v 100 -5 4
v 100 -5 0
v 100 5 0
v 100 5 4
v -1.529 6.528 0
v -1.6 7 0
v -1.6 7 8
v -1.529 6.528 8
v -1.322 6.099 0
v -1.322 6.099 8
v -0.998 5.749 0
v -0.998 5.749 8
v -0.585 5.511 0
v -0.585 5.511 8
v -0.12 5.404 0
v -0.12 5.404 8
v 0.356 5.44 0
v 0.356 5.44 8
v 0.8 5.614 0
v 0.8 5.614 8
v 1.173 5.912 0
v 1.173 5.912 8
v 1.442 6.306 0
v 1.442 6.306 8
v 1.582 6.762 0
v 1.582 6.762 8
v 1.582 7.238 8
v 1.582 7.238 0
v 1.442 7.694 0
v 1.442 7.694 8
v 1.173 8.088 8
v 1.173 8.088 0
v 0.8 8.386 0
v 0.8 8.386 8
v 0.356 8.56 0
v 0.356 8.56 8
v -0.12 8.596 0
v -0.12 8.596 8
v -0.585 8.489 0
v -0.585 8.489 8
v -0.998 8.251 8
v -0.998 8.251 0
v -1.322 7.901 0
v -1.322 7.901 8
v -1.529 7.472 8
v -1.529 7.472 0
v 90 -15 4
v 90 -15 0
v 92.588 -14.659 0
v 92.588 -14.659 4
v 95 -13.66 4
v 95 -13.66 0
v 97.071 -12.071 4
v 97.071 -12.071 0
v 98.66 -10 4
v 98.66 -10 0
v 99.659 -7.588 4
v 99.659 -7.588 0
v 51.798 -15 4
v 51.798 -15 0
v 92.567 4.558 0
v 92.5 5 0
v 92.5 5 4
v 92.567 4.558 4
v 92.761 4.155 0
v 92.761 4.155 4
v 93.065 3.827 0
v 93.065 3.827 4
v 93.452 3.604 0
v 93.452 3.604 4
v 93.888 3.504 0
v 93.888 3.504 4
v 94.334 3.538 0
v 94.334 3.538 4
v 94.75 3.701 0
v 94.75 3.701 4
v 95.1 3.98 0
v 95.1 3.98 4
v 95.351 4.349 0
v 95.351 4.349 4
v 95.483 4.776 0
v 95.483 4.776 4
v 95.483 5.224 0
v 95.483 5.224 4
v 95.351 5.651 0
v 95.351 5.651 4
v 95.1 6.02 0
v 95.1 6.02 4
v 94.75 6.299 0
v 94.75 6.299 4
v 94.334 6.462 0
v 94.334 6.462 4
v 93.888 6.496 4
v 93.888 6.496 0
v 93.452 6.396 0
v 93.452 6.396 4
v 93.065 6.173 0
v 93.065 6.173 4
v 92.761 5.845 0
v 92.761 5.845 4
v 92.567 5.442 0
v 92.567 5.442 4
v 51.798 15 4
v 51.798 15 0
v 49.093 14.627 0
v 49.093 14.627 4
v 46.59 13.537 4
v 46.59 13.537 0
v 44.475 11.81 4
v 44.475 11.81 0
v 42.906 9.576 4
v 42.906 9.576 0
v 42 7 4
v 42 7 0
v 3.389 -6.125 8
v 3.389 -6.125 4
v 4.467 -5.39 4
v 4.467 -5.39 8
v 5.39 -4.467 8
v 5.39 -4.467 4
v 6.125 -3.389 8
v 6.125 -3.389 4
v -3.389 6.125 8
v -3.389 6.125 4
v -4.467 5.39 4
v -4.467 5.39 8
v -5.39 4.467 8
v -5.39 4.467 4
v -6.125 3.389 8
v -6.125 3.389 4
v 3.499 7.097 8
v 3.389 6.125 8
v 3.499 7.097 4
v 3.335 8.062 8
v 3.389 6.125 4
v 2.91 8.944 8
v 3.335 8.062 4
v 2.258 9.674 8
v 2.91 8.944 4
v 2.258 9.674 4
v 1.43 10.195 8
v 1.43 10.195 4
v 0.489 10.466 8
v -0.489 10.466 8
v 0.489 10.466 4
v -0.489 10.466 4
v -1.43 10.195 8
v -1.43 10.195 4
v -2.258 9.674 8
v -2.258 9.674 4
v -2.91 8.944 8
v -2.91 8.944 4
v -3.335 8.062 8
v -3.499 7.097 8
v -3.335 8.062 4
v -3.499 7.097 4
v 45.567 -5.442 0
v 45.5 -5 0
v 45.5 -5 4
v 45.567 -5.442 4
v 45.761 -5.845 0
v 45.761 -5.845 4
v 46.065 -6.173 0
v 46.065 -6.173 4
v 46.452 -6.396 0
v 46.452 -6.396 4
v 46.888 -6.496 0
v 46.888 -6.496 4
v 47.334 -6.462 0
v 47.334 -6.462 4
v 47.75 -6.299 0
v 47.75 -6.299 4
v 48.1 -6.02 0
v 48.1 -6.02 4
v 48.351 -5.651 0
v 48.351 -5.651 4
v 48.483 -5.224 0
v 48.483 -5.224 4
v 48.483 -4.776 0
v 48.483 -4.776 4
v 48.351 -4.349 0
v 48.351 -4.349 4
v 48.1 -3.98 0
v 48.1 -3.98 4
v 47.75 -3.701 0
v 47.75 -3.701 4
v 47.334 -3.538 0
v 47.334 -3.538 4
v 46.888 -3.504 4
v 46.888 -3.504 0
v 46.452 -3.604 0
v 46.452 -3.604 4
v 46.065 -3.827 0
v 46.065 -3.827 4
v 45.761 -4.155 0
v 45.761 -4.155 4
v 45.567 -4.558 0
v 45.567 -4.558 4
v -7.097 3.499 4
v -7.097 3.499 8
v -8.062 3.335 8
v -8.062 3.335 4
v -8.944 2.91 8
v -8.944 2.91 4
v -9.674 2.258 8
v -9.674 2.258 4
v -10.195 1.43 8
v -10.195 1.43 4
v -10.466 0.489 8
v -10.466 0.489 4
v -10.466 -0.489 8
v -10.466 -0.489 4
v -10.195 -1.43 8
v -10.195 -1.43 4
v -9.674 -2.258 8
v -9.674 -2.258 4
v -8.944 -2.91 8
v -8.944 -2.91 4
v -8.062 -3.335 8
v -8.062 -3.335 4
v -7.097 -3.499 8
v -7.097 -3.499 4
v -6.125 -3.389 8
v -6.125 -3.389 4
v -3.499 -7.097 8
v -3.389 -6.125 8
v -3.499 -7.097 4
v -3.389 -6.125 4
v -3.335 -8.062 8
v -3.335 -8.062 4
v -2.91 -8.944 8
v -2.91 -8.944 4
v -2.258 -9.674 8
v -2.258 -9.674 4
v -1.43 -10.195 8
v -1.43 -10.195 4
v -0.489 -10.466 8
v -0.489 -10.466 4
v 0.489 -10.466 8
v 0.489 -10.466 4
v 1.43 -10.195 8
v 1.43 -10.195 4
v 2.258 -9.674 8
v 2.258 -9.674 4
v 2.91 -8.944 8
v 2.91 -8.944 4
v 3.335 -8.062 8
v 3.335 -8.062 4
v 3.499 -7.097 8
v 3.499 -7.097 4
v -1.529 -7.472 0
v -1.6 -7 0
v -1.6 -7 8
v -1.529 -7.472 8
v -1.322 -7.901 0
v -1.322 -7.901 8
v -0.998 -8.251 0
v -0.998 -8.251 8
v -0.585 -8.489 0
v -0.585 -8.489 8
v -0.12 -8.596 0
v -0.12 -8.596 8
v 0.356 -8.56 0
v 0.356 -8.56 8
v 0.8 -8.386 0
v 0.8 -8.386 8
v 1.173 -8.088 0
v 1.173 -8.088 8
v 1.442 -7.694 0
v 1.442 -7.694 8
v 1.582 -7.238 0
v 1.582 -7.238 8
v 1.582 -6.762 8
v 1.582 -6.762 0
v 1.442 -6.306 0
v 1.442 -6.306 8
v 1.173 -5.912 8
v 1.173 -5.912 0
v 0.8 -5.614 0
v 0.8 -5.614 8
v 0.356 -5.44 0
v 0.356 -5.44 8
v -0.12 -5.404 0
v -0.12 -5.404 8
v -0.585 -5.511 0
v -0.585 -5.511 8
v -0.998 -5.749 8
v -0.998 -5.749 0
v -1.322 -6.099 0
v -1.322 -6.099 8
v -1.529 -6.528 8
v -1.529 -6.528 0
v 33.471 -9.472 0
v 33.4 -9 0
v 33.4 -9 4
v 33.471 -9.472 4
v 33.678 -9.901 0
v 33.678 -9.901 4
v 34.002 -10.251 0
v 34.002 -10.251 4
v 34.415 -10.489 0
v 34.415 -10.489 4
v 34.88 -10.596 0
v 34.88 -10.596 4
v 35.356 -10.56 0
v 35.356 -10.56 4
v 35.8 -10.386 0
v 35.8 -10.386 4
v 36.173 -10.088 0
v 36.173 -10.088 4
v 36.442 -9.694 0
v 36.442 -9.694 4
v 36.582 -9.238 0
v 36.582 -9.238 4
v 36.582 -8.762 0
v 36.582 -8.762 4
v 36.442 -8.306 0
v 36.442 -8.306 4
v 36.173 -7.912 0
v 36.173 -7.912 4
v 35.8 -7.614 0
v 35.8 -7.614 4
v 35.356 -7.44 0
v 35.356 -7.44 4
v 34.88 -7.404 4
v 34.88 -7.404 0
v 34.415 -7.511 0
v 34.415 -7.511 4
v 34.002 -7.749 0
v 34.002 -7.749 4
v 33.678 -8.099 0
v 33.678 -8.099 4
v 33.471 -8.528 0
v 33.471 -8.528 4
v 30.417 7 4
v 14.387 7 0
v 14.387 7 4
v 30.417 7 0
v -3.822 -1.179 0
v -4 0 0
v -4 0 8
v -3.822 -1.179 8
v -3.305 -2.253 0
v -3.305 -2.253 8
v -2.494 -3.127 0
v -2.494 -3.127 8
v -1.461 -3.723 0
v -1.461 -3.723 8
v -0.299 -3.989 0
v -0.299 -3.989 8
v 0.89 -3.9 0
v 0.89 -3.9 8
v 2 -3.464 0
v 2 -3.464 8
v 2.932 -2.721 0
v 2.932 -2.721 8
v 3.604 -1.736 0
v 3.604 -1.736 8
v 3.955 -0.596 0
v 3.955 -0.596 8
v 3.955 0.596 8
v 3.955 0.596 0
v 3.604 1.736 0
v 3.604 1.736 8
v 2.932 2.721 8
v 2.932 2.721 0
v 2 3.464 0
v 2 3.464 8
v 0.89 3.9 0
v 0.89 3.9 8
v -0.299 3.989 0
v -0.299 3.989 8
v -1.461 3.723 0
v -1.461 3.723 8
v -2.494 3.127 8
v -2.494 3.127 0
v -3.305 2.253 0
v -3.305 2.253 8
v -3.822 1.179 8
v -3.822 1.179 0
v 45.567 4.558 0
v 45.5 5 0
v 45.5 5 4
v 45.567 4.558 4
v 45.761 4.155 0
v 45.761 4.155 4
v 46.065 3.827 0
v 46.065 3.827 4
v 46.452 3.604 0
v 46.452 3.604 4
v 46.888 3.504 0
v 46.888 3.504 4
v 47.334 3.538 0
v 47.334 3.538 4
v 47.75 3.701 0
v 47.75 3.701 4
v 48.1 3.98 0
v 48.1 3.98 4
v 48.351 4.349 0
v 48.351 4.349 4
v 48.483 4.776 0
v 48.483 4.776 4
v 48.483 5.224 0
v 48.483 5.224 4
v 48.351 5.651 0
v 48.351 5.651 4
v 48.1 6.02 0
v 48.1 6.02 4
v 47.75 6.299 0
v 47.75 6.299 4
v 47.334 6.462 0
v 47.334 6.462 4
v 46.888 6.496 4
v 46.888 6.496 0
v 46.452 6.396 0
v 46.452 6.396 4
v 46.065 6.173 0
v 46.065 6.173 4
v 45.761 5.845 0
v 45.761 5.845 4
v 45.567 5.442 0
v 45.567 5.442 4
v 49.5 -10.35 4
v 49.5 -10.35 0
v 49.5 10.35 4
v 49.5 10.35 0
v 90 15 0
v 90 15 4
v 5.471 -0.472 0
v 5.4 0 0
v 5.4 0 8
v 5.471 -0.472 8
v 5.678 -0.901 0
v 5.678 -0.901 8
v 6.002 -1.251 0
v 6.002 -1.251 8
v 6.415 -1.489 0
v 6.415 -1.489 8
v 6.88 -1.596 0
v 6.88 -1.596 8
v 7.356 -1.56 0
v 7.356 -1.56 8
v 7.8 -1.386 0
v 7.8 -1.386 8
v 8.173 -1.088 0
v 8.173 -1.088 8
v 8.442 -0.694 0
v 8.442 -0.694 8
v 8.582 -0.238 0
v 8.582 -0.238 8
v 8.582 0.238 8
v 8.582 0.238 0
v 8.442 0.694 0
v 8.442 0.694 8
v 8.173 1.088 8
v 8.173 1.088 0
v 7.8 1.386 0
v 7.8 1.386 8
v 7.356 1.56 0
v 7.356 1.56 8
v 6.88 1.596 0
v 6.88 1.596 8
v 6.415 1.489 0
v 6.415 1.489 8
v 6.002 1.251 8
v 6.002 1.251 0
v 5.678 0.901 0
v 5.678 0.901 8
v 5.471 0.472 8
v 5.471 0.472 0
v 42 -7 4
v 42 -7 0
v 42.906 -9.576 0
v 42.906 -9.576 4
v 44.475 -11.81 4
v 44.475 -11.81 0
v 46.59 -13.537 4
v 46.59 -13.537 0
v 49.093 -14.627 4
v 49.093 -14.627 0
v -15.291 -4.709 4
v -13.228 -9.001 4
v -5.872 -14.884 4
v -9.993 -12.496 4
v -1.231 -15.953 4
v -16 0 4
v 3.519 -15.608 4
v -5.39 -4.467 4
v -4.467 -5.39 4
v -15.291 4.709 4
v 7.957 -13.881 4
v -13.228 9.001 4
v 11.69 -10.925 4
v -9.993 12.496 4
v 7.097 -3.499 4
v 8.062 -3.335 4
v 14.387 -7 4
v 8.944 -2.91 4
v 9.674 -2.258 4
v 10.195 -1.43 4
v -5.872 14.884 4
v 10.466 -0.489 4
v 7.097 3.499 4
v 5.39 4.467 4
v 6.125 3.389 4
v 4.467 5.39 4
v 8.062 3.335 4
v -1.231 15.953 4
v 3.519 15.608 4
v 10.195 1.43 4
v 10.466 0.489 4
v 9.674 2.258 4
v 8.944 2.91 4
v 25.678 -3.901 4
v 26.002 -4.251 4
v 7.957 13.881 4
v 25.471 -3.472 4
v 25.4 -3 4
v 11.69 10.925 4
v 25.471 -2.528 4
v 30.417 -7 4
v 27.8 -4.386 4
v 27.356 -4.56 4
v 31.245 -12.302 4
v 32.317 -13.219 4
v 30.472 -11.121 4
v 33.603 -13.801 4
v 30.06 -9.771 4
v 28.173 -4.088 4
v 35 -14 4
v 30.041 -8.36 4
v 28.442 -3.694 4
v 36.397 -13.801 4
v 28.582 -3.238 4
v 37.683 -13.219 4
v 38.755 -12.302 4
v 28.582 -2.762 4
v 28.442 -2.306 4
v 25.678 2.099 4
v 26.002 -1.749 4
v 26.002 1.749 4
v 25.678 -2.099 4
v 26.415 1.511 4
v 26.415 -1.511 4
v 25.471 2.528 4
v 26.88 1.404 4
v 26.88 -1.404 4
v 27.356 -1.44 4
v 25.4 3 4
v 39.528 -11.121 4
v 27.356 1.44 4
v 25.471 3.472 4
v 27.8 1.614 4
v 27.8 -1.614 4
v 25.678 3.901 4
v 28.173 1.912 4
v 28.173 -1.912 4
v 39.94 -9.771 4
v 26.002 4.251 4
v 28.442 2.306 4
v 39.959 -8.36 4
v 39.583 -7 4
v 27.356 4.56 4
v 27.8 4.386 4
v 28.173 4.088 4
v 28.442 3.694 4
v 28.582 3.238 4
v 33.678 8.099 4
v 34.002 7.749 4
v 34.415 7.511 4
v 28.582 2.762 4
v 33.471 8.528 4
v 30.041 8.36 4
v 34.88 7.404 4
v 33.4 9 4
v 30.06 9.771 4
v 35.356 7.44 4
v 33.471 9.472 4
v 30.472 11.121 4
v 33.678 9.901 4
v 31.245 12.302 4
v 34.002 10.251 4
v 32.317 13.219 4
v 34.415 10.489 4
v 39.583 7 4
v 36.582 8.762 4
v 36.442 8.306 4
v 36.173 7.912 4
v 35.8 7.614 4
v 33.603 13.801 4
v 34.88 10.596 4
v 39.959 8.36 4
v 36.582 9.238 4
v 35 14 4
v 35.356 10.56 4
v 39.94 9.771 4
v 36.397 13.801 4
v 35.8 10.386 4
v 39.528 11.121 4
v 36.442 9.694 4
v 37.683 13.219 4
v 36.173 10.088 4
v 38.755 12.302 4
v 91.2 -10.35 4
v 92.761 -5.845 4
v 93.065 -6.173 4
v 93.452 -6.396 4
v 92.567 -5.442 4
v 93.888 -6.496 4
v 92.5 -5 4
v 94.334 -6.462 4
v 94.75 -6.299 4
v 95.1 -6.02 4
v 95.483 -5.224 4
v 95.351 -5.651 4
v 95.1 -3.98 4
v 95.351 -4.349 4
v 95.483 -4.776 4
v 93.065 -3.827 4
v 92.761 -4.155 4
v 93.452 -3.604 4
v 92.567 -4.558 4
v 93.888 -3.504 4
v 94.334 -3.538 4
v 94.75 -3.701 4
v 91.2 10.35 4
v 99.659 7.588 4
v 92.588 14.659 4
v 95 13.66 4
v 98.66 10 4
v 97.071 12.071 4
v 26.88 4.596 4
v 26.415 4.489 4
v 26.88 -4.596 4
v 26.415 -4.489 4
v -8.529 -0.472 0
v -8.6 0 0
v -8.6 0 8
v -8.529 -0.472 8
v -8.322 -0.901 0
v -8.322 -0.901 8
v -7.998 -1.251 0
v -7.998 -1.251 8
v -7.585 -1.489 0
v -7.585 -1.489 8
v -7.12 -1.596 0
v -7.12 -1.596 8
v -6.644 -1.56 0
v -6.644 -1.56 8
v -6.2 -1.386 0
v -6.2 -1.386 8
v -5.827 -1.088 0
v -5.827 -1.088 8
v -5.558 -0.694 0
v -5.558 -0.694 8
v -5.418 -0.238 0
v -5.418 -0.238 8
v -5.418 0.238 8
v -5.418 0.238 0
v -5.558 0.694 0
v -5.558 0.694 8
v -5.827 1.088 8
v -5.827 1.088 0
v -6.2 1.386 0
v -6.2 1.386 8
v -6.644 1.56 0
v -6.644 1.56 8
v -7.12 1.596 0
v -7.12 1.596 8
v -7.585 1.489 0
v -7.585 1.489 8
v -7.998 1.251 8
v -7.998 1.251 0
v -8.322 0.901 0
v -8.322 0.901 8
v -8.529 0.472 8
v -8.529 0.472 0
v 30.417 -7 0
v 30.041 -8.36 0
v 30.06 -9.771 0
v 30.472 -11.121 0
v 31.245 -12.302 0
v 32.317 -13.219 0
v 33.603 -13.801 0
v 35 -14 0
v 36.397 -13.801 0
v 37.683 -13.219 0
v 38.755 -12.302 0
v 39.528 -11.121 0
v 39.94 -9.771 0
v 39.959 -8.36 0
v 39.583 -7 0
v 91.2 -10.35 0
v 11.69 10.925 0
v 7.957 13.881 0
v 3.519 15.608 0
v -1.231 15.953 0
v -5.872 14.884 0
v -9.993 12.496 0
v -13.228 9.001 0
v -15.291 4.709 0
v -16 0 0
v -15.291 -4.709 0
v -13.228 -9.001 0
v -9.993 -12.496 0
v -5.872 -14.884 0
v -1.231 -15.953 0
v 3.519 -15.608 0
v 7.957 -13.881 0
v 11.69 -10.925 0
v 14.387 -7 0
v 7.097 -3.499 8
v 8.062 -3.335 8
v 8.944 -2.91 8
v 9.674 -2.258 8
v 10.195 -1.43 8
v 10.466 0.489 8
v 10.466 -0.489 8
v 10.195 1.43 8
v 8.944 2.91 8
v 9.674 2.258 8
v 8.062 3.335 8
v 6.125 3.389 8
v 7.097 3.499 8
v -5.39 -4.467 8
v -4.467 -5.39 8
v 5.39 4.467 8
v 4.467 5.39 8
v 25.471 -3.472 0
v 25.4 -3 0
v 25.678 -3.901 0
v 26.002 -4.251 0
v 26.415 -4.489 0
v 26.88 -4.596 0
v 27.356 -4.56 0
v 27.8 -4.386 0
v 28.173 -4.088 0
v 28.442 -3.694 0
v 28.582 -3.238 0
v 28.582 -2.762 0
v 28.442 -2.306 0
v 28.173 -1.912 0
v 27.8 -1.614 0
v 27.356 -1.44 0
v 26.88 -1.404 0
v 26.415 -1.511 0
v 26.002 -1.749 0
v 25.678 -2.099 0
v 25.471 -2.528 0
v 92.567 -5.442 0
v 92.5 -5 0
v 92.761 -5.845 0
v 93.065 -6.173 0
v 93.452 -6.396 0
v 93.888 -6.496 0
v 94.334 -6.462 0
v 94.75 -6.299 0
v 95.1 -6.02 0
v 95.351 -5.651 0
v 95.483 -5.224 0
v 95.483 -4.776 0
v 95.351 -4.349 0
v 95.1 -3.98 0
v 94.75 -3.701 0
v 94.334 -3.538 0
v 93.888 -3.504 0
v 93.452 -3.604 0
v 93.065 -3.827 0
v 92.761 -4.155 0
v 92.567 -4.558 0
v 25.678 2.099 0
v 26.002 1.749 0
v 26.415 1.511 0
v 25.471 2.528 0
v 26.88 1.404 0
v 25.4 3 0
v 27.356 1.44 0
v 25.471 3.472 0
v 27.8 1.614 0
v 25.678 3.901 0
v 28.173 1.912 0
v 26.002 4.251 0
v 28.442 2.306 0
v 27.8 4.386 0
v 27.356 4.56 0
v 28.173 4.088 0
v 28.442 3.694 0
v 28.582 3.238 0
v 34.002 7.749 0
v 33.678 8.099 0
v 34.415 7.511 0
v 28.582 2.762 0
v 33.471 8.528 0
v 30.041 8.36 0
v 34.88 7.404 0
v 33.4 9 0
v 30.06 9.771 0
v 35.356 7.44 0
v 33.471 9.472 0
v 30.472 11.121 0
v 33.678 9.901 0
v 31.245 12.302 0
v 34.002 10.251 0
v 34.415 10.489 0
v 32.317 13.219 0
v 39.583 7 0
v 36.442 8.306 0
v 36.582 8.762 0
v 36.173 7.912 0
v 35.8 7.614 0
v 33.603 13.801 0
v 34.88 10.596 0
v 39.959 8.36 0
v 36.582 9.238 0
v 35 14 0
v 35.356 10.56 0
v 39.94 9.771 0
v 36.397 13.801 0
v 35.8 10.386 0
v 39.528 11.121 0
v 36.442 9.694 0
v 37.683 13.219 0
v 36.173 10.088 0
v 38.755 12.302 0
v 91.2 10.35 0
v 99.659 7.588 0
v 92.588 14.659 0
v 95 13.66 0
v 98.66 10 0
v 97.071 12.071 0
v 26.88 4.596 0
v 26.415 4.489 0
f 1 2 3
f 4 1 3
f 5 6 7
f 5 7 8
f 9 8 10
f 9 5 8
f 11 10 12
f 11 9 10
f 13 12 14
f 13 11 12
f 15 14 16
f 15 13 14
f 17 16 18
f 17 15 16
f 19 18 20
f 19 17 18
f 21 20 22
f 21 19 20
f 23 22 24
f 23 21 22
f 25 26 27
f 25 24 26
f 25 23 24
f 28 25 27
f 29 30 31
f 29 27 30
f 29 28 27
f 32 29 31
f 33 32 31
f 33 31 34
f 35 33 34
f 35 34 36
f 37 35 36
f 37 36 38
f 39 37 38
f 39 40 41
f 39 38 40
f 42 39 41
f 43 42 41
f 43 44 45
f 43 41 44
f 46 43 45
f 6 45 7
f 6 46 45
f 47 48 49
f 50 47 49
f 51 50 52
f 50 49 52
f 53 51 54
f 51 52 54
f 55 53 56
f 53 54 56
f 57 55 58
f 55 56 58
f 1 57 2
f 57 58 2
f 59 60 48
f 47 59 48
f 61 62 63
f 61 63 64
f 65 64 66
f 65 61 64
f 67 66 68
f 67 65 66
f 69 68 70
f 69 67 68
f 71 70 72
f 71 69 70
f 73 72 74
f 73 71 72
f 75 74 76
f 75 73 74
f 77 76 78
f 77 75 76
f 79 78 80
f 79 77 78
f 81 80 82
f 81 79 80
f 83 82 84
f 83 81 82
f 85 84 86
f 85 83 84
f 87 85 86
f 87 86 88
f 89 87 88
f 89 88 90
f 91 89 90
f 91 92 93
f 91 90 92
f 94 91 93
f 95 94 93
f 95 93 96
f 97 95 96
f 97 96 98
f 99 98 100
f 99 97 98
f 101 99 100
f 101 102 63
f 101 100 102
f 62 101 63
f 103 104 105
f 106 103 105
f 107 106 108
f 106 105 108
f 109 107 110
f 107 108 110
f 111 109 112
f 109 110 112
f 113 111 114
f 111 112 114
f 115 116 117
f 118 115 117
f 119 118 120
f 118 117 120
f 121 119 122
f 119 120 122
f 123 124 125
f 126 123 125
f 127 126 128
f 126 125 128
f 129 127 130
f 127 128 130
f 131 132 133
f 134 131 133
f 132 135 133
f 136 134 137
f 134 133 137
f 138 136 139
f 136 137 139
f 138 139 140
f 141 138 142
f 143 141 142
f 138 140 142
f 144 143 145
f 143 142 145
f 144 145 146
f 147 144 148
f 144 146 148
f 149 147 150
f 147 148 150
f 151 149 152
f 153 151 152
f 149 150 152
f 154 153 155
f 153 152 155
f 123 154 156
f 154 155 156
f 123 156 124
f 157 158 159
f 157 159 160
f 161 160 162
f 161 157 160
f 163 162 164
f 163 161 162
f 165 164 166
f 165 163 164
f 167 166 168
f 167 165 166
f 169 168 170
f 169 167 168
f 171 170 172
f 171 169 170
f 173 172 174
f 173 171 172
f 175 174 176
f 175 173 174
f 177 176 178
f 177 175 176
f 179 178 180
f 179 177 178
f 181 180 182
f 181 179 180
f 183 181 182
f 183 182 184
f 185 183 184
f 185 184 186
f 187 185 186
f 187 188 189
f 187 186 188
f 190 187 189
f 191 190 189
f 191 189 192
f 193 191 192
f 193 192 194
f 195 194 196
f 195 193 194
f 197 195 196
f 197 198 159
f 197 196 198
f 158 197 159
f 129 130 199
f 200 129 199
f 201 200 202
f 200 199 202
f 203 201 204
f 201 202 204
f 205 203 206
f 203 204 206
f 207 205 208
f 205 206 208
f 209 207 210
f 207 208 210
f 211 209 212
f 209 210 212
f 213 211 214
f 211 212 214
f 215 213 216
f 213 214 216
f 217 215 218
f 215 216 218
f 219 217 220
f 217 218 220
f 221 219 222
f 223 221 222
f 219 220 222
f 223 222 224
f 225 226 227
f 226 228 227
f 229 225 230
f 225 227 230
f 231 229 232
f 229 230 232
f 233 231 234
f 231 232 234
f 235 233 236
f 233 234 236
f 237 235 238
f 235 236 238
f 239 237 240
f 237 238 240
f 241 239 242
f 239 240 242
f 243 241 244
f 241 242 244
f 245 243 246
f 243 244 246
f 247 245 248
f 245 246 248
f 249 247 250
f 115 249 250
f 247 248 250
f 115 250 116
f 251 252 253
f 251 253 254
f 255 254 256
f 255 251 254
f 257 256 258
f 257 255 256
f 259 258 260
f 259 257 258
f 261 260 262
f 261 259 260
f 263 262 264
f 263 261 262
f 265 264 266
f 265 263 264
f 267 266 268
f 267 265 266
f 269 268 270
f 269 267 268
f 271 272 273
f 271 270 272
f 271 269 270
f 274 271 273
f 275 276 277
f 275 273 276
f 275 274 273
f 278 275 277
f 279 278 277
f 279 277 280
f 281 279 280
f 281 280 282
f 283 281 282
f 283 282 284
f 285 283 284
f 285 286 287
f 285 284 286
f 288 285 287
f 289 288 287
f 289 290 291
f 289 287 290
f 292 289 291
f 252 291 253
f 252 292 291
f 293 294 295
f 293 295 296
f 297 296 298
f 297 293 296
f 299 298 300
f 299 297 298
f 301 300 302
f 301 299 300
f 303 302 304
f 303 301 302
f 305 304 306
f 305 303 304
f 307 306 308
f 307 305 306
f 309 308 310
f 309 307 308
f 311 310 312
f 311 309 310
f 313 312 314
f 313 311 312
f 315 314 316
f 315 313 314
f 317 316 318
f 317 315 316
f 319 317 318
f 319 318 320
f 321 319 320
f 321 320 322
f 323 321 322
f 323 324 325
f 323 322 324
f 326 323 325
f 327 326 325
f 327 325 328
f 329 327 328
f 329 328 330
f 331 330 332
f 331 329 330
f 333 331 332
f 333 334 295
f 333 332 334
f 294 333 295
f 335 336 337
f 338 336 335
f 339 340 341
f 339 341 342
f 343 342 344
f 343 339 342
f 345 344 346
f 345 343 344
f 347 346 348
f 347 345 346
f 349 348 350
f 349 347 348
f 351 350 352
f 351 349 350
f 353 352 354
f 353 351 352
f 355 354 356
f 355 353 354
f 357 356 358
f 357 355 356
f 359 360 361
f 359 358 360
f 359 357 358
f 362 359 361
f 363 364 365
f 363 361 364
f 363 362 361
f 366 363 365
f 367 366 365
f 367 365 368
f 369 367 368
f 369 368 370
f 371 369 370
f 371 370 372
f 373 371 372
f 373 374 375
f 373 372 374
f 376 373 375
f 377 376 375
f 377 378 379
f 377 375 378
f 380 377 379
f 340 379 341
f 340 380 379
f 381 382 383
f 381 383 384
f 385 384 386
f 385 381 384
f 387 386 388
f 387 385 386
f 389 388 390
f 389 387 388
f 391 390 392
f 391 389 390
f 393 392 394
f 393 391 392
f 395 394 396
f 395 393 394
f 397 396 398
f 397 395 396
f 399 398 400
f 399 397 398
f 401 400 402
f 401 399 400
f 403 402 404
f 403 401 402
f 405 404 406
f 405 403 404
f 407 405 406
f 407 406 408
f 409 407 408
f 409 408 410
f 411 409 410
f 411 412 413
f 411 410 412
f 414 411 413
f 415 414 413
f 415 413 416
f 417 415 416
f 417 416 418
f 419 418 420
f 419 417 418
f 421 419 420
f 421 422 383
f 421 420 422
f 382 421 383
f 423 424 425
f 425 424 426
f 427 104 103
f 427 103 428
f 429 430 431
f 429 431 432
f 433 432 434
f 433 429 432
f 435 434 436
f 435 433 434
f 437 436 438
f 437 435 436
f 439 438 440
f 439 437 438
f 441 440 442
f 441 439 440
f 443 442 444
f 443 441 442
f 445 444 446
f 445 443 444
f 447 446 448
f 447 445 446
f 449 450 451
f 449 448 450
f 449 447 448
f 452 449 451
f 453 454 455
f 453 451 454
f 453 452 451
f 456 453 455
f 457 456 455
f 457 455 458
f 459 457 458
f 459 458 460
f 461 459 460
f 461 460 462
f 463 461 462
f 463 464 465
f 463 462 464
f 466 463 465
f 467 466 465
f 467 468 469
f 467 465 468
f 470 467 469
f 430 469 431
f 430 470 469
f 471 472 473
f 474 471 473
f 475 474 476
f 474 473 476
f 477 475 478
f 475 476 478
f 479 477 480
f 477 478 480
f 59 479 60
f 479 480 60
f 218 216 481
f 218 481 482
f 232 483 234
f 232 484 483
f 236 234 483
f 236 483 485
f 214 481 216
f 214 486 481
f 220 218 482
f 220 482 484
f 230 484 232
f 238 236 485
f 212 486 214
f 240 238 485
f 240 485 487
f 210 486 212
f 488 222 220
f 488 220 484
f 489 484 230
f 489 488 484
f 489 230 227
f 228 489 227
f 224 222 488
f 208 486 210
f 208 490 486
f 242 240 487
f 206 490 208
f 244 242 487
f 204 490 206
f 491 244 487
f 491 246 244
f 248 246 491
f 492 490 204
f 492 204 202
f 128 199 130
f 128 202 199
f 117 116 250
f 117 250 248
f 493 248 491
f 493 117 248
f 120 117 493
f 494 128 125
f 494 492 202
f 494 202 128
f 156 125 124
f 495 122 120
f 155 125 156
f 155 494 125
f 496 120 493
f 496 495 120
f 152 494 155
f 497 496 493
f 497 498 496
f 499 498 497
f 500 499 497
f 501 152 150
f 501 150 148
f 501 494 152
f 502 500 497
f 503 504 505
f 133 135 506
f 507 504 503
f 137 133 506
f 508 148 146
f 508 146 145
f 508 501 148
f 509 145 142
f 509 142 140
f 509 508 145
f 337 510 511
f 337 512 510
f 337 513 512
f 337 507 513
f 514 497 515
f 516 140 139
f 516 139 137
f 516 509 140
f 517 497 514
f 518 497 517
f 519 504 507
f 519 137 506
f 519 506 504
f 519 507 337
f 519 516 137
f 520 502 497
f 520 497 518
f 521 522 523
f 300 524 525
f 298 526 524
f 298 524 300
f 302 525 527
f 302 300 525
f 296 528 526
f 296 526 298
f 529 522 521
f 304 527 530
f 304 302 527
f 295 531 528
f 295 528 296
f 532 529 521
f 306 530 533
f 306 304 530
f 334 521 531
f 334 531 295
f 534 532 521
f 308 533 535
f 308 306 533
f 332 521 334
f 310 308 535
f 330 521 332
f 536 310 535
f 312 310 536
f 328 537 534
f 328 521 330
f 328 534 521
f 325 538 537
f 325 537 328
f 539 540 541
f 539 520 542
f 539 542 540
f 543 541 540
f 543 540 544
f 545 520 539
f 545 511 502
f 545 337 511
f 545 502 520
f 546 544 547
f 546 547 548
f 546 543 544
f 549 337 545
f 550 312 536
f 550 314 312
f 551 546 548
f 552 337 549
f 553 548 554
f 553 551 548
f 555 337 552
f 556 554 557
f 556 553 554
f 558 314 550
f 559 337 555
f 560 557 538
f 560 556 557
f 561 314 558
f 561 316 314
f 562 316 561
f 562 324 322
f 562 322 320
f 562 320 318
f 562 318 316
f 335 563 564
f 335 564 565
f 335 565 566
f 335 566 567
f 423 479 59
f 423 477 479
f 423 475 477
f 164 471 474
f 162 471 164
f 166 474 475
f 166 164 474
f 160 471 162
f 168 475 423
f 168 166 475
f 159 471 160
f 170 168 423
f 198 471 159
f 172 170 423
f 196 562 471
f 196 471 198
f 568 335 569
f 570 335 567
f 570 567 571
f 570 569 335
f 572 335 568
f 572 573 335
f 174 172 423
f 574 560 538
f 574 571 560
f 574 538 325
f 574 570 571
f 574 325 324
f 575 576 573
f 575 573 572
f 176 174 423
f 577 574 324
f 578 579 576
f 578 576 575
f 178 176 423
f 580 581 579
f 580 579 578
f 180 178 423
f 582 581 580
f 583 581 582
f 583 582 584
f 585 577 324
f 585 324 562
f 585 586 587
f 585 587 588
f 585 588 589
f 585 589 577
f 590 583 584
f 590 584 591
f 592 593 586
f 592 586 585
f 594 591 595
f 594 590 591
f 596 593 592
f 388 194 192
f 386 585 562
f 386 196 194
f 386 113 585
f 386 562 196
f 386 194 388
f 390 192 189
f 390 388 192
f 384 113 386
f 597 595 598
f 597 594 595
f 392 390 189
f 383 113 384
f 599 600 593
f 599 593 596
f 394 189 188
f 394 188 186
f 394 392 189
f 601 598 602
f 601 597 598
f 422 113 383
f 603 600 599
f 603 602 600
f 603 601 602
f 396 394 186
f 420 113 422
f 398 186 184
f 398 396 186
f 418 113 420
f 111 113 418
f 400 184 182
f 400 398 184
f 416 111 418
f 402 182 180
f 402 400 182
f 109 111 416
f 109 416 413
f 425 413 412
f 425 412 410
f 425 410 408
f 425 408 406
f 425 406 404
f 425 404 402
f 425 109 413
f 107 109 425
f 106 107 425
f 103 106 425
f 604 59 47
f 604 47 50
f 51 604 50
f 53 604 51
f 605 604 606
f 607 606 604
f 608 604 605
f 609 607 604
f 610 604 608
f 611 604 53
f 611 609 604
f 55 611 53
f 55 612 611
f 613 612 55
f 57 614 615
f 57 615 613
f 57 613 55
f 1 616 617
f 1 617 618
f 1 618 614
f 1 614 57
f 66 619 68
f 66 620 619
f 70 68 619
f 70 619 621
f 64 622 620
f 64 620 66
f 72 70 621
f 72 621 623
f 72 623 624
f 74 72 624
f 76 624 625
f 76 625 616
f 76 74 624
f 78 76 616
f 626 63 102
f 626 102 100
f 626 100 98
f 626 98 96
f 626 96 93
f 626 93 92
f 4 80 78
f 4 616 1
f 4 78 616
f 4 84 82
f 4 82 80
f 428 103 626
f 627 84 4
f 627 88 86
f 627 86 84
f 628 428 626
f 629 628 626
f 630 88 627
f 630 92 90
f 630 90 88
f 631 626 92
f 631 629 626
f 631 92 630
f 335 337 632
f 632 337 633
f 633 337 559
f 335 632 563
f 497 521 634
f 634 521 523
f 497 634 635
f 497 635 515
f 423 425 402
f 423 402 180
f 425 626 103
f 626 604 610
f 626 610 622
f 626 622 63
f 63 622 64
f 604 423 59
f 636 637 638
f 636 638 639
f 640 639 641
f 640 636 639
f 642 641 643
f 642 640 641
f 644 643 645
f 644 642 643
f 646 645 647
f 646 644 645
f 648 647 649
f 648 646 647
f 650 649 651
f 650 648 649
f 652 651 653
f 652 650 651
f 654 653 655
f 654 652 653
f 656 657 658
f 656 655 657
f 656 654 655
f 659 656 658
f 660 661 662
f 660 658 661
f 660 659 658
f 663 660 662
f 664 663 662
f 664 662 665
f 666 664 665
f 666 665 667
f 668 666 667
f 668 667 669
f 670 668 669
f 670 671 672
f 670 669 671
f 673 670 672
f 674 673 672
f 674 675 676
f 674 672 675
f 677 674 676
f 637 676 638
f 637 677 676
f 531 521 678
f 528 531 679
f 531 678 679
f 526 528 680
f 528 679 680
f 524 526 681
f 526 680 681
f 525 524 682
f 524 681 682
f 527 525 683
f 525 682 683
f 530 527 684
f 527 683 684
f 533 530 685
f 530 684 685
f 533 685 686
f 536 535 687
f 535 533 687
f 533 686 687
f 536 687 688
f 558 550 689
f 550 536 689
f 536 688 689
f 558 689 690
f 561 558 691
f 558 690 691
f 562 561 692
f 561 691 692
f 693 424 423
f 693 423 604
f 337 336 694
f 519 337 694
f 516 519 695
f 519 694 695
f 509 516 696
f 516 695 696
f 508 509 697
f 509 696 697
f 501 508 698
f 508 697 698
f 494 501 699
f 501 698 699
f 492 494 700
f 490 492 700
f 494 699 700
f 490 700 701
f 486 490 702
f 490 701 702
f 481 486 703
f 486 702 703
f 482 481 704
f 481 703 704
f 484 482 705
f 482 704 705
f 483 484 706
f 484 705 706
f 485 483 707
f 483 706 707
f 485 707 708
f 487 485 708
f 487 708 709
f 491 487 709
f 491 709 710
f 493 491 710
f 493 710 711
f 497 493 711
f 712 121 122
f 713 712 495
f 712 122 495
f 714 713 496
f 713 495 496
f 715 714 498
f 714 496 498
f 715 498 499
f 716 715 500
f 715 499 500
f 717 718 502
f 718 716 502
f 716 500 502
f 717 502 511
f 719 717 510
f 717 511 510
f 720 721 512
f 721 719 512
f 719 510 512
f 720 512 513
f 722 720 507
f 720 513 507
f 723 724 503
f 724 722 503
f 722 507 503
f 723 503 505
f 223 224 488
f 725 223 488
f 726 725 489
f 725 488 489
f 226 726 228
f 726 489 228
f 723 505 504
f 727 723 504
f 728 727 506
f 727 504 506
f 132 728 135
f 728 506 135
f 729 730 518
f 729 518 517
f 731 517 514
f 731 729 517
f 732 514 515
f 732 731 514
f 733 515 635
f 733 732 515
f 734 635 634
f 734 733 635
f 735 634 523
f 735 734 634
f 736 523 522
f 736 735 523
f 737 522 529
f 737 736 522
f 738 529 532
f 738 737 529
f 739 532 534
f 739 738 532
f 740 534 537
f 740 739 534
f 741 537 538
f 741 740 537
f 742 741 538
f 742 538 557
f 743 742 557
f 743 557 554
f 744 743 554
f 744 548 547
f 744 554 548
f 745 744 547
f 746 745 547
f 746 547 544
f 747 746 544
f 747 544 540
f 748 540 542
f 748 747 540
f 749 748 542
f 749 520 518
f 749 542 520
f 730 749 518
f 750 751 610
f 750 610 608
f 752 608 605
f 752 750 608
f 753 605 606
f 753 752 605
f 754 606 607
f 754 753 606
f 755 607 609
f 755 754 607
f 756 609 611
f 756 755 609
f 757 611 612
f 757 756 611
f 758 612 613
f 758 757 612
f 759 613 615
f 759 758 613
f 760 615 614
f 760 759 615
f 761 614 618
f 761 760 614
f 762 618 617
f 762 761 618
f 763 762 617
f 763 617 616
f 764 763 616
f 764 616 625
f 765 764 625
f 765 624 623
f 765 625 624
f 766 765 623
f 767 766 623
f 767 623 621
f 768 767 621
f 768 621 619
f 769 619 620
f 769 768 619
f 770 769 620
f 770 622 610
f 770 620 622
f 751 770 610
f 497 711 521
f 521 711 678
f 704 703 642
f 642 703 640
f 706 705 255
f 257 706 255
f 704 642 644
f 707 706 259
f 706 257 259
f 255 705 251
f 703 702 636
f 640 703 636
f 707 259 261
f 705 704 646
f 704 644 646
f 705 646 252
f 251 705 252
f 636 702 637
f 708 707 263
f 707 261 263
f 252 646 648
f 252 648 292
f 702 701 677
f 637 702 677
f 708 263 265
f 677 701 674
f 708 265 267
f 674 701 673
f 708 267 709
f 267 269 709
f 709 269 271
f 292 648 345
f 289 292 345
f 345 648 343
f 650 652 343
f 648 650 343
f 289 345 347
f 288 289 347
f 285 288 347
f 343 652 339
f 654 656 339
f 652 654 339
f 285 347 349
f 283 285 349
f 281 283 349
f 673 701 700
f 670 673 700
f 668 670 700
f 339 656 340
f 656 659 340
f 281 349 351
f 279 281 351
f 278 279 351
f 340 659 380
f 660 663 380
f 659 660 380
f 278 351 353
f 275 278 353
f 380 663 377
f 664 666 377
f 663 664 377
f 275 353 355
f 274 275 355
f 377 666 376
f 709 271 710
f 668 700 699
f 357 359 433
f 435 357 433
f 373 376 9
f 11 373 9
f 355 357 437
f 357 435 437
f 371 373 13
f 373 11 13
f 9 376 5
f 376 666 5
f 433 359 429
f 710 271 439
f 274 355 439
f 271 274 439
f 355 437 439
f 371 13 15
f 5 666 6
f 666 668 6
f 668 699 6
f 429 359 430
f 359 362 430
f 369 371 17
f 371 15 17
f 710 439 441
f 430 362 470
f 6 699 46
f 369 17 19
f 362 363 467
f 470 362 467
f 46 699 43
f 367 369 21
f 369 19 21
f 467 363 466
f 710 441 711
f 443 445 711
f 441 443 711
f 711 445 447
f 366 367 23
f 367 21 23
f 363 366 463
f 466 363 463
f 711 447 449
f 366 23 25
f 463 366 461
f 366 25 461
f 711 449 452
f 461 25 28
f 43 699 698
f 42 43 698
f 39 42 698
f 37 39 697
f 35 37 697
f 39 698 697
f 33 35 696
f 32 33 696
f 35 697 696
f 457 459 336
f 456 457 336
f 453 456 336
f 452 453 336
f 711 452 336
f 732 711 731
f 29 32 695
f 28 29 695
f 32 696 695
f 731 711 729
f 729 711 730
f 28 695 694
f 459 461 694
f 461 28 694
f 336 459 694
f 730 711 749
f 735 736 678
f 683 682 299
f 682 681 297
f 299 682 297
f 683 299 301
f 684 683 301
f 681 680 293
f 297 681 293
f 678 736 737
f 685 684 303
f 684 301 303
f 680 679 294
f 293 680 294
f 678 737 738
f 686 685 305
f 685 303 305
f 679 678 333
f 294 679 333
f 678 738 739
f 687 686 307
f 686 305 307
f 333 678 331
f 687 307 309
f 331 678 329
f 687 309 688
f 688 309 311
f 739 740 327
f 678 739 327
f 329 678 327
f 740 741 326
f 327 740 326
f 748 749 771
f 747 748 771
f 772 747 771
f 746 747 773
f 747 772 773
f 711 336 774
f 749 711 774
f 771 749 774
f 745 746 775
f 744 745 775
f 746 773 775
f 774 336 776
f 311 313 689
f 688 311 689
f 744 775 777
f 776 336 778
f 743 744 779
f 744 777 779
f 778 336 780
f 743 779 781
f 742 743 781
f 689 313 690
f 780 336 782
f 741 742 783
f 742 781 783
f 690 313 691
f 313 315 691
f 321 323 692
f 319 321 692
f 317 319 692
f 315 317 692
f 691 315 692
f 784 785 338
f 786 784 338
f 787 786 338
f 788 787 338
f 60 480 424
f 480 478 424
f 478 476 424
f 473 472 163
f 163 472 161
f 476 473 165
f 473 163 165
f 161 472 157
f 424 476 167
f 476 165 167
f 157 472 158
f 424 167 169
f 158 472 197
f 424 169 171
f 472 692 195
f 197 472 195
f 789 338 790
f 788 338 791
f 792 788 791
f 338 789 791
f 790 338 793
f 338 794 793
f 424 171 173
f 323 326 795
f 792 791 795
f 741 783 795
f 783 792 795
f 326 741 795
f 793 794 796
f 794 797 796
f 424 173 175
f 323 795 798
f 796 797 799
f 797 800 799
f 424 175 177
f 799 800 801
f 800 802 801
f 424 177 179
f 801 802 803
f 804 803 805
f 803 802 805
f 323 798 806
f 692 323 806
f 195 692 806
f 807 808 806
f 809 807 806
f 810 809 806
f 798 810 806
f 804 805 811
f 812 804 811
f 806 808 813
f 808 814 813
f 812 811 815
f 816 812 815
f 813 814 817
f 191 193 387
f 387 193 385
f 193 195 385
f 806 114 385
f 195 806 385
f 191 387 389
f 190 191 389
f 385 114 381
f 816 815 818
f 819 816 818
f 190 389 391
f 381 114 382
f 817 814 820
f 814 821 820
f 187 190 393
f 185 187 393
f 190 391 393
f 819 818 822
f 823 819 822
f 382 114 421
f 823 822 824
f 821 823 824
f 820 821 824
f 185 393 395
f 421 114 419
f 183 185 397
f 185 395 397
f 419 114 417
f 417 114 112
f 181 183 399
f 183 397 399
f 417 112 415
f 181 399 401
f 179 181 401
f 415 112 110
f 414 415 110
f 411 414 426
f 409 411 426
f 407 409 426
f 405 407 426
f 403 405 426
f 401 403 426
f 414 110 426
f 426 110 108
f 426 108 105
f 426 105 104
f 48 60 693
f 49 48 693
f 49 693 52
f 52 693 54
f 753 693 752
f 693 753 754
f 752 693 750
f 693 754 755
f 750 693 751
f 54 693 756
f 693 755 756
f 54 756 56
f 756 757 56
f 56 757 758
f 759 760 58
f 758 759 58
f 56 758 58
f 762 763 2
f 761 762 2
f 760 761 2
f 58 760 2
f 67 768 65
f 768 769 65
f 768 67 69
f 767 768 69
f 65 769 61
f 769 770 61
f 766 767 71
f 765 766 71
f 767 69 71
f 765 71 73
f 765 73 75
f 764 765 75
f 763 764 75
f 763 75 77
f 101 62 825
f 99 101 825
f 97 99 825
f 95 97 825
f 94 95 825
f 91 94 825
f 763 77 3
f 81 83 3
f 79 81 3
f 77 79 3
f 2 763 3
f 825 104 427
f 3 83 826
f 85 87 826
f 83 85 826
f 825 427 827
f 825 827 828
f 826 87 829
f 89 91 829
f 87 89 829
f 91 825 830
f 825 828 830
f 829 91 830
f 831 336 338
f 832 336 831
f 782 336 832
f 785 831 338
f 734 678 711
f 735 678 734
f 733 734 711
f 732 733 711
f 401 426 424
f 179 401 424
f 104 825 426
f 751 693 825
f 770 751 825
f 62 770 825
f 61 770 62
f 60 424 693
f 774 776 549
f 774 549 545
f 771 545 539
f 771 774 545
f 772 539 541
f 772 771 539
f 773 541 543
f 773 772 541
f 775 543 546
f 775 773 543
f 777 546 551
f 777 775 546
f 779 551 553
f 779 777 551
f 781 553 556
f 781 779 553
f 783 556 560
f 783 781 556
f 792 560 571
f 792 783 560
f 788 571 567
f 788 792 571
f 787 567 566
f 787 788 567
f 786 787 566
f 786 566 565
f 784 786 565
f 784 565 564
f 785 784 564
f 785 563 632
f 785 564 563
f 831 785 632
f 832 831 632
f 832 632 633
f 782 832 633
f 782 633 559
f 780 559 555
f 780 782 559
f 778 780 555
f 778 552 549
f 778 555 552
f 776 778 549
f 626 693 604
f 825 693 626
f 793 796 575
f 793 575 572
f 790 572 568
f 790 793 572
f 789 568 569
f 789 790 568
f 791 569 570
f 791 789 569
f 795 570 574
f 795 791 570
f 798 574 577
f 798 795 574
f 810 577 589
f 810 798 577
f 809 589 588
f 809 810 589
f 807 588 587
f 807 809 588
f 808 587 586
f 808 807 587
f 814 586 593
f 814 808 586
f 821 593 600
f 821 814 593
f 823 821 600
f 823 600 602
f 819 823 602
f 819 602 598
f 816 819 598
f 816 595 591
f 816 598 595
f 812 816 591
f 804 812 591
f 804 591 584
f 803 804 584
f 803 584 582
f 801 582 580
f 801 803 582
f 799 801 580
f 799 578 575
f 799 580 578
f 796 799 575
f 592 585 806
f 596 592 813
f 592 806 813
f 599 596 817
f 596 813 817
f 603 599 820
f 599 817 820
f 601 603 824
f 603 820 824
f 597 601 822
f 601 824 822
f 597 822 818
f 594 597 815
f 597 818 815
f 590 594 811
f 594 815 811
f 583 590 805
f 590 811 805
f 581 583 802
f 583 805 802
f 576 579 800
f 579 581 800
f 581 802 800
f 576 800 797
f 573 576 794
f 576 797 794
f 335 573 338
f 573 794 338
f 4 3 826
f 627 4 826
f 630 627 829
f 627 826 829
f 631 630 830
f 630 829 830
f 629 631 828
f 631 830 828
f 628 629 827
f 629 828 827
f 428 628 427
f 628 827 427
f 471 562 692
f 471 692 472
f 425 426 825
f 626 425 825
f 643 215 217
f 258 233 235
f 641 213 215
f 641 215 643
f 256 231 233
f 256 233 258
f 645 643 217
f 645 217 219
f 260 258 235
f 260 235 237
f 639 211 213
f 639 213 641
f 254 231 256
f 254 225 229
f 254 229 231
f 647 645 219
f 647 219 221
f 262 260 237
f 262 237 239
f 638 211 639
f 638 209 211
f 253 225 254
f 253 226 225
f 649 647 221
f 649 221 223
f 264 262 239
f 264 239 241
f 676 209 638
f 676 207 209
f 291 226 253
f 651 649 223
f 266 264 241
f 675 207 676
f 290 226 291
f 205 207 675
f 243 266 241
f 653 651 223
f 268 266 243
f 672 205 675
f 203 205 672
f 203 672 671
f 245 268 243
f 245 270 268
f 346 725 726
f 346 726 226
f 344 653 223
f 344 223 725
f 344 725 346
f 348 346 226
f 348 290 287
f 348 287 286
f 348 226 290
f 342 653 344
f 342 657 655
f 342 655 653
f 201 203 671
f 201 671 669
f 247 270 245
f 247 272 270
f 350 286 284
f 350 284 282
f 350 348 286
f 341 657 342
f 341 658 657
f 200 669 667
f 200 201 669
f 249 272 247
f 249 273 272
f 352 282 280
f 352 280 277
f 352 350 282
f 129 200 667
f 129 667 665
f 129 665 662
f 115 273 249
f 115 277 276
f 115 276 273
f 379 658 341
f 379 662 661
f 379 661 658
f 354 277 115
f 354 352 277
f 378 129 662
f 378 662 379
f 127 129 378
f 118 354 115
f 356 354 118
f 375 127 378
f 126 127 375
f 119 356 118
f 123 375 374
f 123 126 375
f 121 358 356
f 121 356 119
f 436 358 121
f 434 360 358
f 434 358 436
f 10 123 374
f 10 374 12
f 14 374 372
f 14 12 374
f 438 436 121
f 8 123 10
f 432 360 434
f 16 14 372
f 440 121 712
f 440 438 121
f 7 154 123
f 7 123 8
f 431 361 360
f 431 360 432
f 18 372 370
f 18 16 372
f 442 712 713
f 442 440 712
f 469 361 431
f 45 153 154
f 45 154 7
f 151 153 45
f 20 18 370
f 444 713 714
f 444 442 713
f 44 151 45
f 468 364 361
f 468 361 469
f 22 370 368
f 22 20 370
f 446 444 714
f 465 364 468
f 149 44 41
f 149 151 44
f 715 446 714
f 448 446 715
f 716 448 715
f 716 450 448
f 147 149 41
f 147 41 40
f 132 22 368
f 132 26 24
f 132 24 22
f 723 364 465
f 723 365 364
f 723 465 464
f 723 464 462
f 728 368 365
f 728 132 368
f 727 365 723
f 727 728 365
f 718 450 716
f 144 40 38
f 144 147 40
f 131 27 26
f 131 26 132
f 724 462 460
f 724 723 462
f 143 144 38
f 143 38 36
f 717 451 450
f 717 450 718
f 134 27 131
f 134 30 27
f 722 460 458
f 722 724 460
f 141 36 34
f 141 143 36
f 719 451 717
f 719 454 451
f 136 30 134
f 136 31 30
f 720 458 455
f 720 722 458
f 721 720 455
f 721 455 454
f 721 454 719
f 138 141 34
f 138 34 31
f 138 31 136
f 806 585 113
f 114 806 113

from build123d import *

# Parameters (mm, degrees)
MAIN_WEB_PROFILE_W                             = 60
MAIN_WEB_PROFILE_H                             = 14
MAIN_WEB_DEPTH                                 = 4
SHOULDER_HORN_FLANGE_PROFILE_R                 = 16
SHOULDER_HORN_FLANGE_DEPTH                     = 4
ELBOW_SERVO_MOUNT_PROFILE_W                    = 48
ELBOW_SERVO_MOUNT_PROFILE_H                    = 28
ELBOW_SERVO_MOUNT_DEPTH                        = 4
SG90_BODY_CLEARANCE_START                      = -5
SG90_BODY_CLEARANCE_PROFILE_W                  = 23.8
SG90_BODY_CLEARANCE_PROFILE_H                  = 13
SG90_BODY_CLEARANCE_DEPTH                      = 97.49863387
ELBOW_TAB_FASTENERS_START                      = -50
ELBOW_TAB_FASTENERS_PROFILE_R                  = 1.3
ELBOW_TAB_FASTENERS_DEPTH                      = 142.49863387
SHOULDER_CENTER_SCREW_ACCESS_START             = -50
SHOULDER_CENTER_SCREW_ACCESS_PROFILE_R         = 4
SHOULDER_CENTER_SCREW_ACCESS_DEPTH             = 142.49863387
CABLE_TIE_HOLES_START                          = -50
CABLE_TIE_HOLES_PROFILE_R                      = 1.6
CABLE_TIE_HOLES_DEPTH                          = 142.49863387
PASSIVE_LOWER_MOUNT_BOSS_PROFILE_R             = 5
PASSIVE_LOWER_MOUNT_BOSS_DEPTH                 = 4
PASSIVE_UPPER_MOUNT_BOSS_PROFILE_R             = 5
PASSIVE_UPPER_MOUNT_BOSS_DEPTH                 = 4
PASSIVE_CHEEK_STANDOFFS_START                  = -50
PASSIVE_CHEEK_STANDOFFS_PROFILE_R              = 1.6
PASSIVE_CHEEK_STANDOFFS_DEPTH                  = 142.49863387
SHOULDER_DOWEL_SUPPORT_HUB_START               = 4
SHOULDER_DOWEL_SUPPORT_HUB_PROFILE_R           = 7
SHOULDER_DOWEL_SUPPORT_HUB_PROFILE_R_2         = 4
SHOULDER_DOWEL_SUPPORT_HUB_DEPTH               = 4
RAISED_M3_WASHER_SEATS_HEIGHT8_START           = 4
RAISED_M3_WASHER_SEATS_PCD14_PROFILE_R         = 3.5
RAISED_M3_WASHER_SEATS_HEIGHT8_DEPTH           = 4
METAL_HORN_M3_CLEARANCE_PCD14_START            = -50
METAL_HORN_M3_CLEARANCE_PCD14_PROFILE_R        = 1.6
METAL_HORN_M3_CLEARANCE_PCD14_DEPTH            = 142.760557976
RESTORE_SHOULDER_SLEEVE_BORE_START             = -50
RESTORE_SHOULDER_SLEEVE_BORE_PROFILE_R         = 4
RESTORE_SHOULDER_SLEEVE_BORE_DEPTH             = 142.760557976
FILLET1_R                                      = 7.5
LARGER_ELBOW_SERVO_MOUNT_REPLACES_SG_2_W       = 58
LARGER_ELBOW_SERVO_MOUNT_REPLACES_SG_2_H       = 30
LARGER_ELBOW_SERVO_MOUNT_REPLACES_SG90_O_DEPTH = 4
MG996R_ELBOW_BODY_CLEARANCE_START              = -5
MG996R_ELBOW_BODY_CLEARANCE_PROFILE_W          = 41.7
MG996R_ELBOW_BODY_CLEARANCE_PROFILE_H          = 20.7
MG996R_ELBOW_BODY_CLEARANCE_DEPTH              = 107.587400794
MG996R_ELBOW_TAB_FASTENERS_START               = -50
MG996R_ELBOW_TAB_FASTENERS_PROFILE_R           = 1.5
MG996R_ELBOW_TAB_FASTENERS_DEPTH               = 152.587400794
FILLET2_R                                      = 10


with BuildPart() as part:
    # Main_web_profile → Main_web (new body)
    with BuildSketch(Plane.XY):
        with Locations((30, 0)):
            Rectangle(MAIN_WEB_PROFILE_W, MAIN_WEB_PROFILE_H)
    extrude(amount=MAIN_WEB_DEPTH)

    # Shoulder_horn_flange_profile → Shoulder_horn_flange (add)
    with BuildSketch(Plane.XY):
        Circle(SHOULDER_HORN_FLANGE_PROFILE_R)
    extrude(amount=SHOULDER_HORN_FLANGE_DEPTH)

    # Elbow_servo_mount_profile → Elbow_servo_mount (add)
    with BuildSketch(Plane.XY):
        with Locations((66, 0)):
            Rectangle(ELBOW_SERVO_MOUNT_PROFILE_W, ELBOW_SERVO_MOUNT_PROFILE_H)
    extrude(amount=ELBOW_SERVO_MOUNT_DEPTH)

    # SG90_body_clearance_profile → SG90_body_clearance (cut, through all)
    with BuildSketch(Plane.XY.offset(SG90_BODY_CLEARANCE_START)):
        with Locations((65.5, 0)):
            Rectangle(SG90_BODY_CLEARANCE_PROFILE_W, SG90_BODY_CLEARANCE_PROFILE_H)
    extrude(amount=SG90_BODY_CLEARANCE_DEPTH, mode=Mode.SUBTRACT)

    # Elbow_tab_fasteners_profile → Elbow_tab_fasteners (cut, through all)
    with BuildSketch(Plane.XY.offset(ELBOW_TAB_FASTENERS_START)):
        with Locations(Location((51, 0, 0), (0, 0, 180))):
            Circle(ELBOW_TAB_FASTENERS_PROFILE_R)
        with Locations(Location((80, 0, 0), (0, 0, 180))):
            Circle(ELBOW_TAB_FASTENERS_PROFILE_R)
    extrude(amount=ELBOW_TAB_FASTENERS_DEPTH, mode=Mode.SUBTRACT)

    # Shoulder_center_screw_access_profile → Shoulder_center_screw_access (cut, through all)
    with BuildSketch(Plane.XY.offset(SHOULDER_CENTER_SCREW_ACCESS_START)):
        with Locations(Location((0, 0, 0), (0, 0, 180))):
            Circle(SHOULDER_CENTER_SCREW_ACCESS_PROFILE_R)
    extrude(amount=SHOULDER_CENTER_SCREW_ACCESS_DEPTH, mode=Mode.SUBTRACT)

    # Cable_tie_holes_profile → Cable_tie_holes (cut, through all)
    with BuildSketch(Plane.XY.offset(CABLE_TIE_HOLES_START)):
        with Locations(Location((27, -3, 0), (0, 0, 180))):
            Circle(CABLE_TIE_HOLES_PROFILE_R)
        with Locations(Location((27, 3, 0), (0, 0, 180))):
            Circle(CABLE_TIE_HOLES_PROFILE_R)
    extrude(amount=CABLE_TIE_HOLES_DEPTH, mode=Mode.SUBTRACT)

    # Passive_lower_mount_boss_profile → Passive_lower_mount_boss (add)
    with BuildSketch(Plane.XY):
        with Locations((35, -9)):
            Circle(PASSIVE_LOWER_MOUNT_BOSS_PROFILE_R)
    extrude(amount=PASSIVE_LOWER_MOUNT_BOSS_DEPTH)

    # Passive_upper_mount_boss_profile → Passive_upper_mount_boss (add)
    with BuildSketch(Plane.XY):
        with Locations((35, 9)):
            Circle(PASSIVE_UPPER_MOUNT_BOSS_PROFILE_R)
    extrude(amount=PASSIVE_UPPER_MOUNT_BOSS_DEPTH)

    # Passive_cheek_standoffs_profile → Passive_cheek_standoffs (cut, through all)
    with BuildSketch(Plane.XY.offset(PASSIVE_CHEEK_STANDOFFS_START)):
        with Locations(Location((35, -9, 0), (0, 0, 180))):
            Circle(PASSIVE_CHEEK_STANDOFFS_PROFILE_R)
        with Locations(Location((35, 9, 0), (0, 0, 180))):
            Circle(PASSIVE_CHEEK_STANDOFFS_PROFILE_R)
    extrude(amount=PASSIVE_CHEEK_STANDOFFS_DEPTH, mode=Mode.SUBTRACT)

    # Shoulder_dowel_support_hub_profile → Shoulder_dowel_support_hub (add)
    with BuildSketch(Plane.XY.offset(SHOULDER_DOWEL_SUPPORT_HUB_START)):
        Circle(SHOULDER_DOWEL_SUPPORT_HUB_PROFILE_R)
        with Locations(Location((0, 0, 0), (0, 0, 180))):
            Circle(SHOULDER_DOWEL_SUPPORT_HUB_PROFILE_R_2, mode=Mode.SUBTRACT)
    extrude(amount=SHOULDER_DOWEL_SUPPORT_HUB_DEPTH)

    # Raised_M3_washer_seats_PCD14_profile → Raised_M3_washer_seats_height8 (add)
    with BuildSketch(Plane.XY.offset(RAISED_M3_WASHER_SEATS_HEIGHT8_START)):
        with Locations((7, 0)):
            Circle(RAISED_M3_WASHER_SEATS_PCD14_PROFILE_R)
        with Locations((-7, 0)):
            Circle(RAISED_M3_WASHER_SEATS_PCD14_PROFILE_R)
        with Locations((0, 7)):
            Circle(RAISED_M3_WASHER_SEATS_PCD14_PROFILE_R)
        with Locations((0, -7)):
            Circle(RAISED_M3_WASHER_SEATS_PCD14_PROFILE_R)
    extrude(amount=RAISED_M3_WASHER_SEATS_HEIGHT8_DEPTH)

    # Metal_horn_M3_clearance_PCD14_profile → Metal_horn_M3_clearance_PCD14 (cut, through all)
    with BuildSketch(Plane.XY.offset(METAL_HORN_M3_CLEARANCE_PCD14_START)):
        with Locations(Location((7, 0, 0), (0, 0, 180))):
            Circle(METAL_HORN_M3_CLEARANCE_PCD14_PROFILE_R)
        with Locations(Location((-7, 0, 0), (0, 0, 180))):
            Circle(METAL_HORN_M3_CLEARANCE_PCD14_PROFILE_R)
        with Locations(Location((0, 7, 0), (0, 0, 180))):
            Circle(METAL_HORN_M3_CLEARANCE_PCD14_PROFILE_R)
        with Locations(Location((0, -7, 0), (0, 0, 180))):
            Circle(METAL_HORN_M3_CLEARANCE_PCD14_PROFILE_R)
    extrude(amount=METAL_HORN_M3_CLEARANCE_PCD14_DEPTH, mode=Mode.SUBTRACT)

    # Restore_shoulder_sleeve_bore_profile → Restore_shoulder_sleeve_bore (cut, through all)
    with BuildSketch(Plane.XY.offset(RESTORE_SHOULDER_SLEEVE_BORE_START)):
        with Locations(Location((0, 0, 0), (0, 0, 180))):
            Circle(RESTORE_SHOULDER_SLEEVE_BORE_PROFILE_R)
    extrude(amount=RESTORE_SHOULDER_SLEEVE_BORE_DEPTH, mode=Mode.SUBTRACT)

    # Fillet1
    # the kernel refuses this fillet: 7.5 mm, written as the material it takes off along each edge
    with BuildSketch(Plane(origin=(42, -14, -18.708286934), x_dir=(0, 1, 0), z_dir=(0, 0, 1))) as fillet1_piece_1:
        with BuildLine():
            CenterArc((7.5, -7.483314774), FILLET1_R, 93.822553729, 86.177446271)
            Line((0, -7.483314774), (-0.15, -7.483314774))
            Line((-0.15, -7.483314774), (-0.15, 0))
            Line((-0.15, 0), (0, 0.15))
            ThreePointArc((0, 0.15), (3.5, 0.15), (6.99, 0.149666295))
            Line((6.99, 0.149666295), (7, 0))
        make_face()
    extrude(amount=41.416573868, mode=Mode.SUBTRACT)
    with BuildSketch(Plane(origin=(90, -14, -18.75), x_dir=(-1, 0, 0), z_dir=(0, 0, 1)), Plane(origin=(90, 14, -18.75), x_dir=(0, -1, 0), z_dir=(0, 0, 1))) as fillet1_piece_2:
        with BuildLine():
            CenterArc((FILLET1_R, -FILLET1_R), FILLET1_R, 90, 90)
            Line((0, -FILLET1_R), (-FILLET1_R * 0.02, -FILLET1_R))
            Line((-FILLET1_R * 0.02, -FILLET1_R), (-FILLET1_R * 0.02, FILLET1_R * 0.02))
            Line((-FILLET1_R * 0.02, FILLET1_R * 0.02), (FILLET1_R, FILLET1_R * 0.02))
            Line((FILLET1_R, FILLET1_R * 0.02), (FILLET1_R, 0))
        make_face()
    extrude(amount=41.5, mode=Mode.SUBTRACT)
    with BuildSketch(Plane(origin=(42, 14, -18.708286934), x_dir=(0, -1, 0), z_dir=(0, 0, 1))) as fillet1_piece_3:
        with BuildLine():
            CenterArc((7.5, 7.483314774), FILLET1_R, 180, 86.177446271)
            Line((0, 7.483314774), (-0.15, 7.483314774))
            Line((-0.15, 7.483314774), (-0.15, 0))
            Line((-0.15, 0), (0, -0.15))
            ThreePointArc((0, -0.15), (3.5, -0.15), (6.99, -0.149666295))
            Line((6.99, -0.149666295), (7, 0))
        make_face()
    extrude(amount=41.416573868, mode=Mode.SUBTRACT)

    # Larger_elbow_servo_mount_replaces_SG 2 → Larger_elbow_servo_mount_replaces_SG90_o (add)
    with BuildSketch(Plane.XY):
        with Locations((71, 0)):
            Rectangle(LARGER_ELBOW_SERVO_MOUNT_REPLACES_SG_2_W, LARGER_ELBOW_SERVO_MOUNT_REPLACES_SG_2_H)
    extrude(amount=LARGER_ELBOW_SERVO_MOUNT_REPLACES_SG90_O_DEPTH)

    # MG996R_elbow_body_clearance_profile → MG996R_elbow_body_clearance (cut, through all)
    with BuildSketch(Plane.XY.offset(MG996R_ELBOW_BODY_CLEARANCE_START)):
        with Locations((70.35, 0)):
            Rectangle(MG996R_ELBOW_BODY_CLEARANCE_PROFILE_W, MG996R_ELBOW_BODY_CLEARANCE_PROFILE_H)
    extrude(amount=MG996R_ELBOW_BODY_CLEARANCE_DEPTH, mode=Mode.SUBTRACT)

    # MG996R_elbow_tab_fasteners_profile → MG996R_elbow_tab_fasteners (cut, through all)
    with BuildSketch(Plane.XY.offset(MG996R_ELBOW_TAB_FASTENERS_START)):
        with Locations(Location((47, -5, 0), (0, 0, 180))):
            Circle(MG996R_ELBOW_TAB_FASTENERS_PROFILE_R)
        with Locations(Location((47, 5, 0), (0, 0, 180))):
            Circle(MG996R_ELBOW_TAB_FASTENERS_PROFILE_R)
        with Locations(Location((94, -5, 0), (0, 0, 180))):
            Circle(MG996R_ELBOW_TAB_FASTENERS_PROFILE_R)
        with Locations(Location((94, 5, 0), (0, 0, 180))):
            Circle(MG996R_ELBOW_TAB_FASTENERS_PROFILE_R)
    extrude(amount=MG996R_ELBOW_TAB_FASTENERS_DEPTH, mode=Mode.SUBTRACT)

    # Fillet2
    # the kernel refuses this fillet: 10 mm, written as the material it takes off along each edge
    with BuildSketch(Plane(origin=(42, 15, -24.494897428), x_dir=(1, 0, 0), z_dir=(0, 0, 1))) as fillet2_piece_1:
        with BuildLine():
            CenterArc((9.797958971, -10), FILLET2_R, 90, 78.463040967)
            Line((0, -8), (-0.195959179, -7.96))
            ThreePointArc((-0.195959179, -7.96), (-0.2, -4), (-0.2, 0))
            Line((-0.2, 0), (0, 0.2))
            Line((0, 0.2), (9.797958971, 0.2))
            Line((9.797958971, 0.2), (9.797958971, 0))
        make_face()
    extrude(amount=52.989794856, mode=Mode.SUBTRACT)
    with BuildSketch(Plane(origin=(42, -15, -24.494897428), x_dir=(0, 1, 0), z_dir=(0, 0, 1))) as fillet2_piece_2:
        with BuildLine():
            CenterArc((10, -9.797958971), FILLET2_R, 101.536959033, 78.463040967)
            Line((0, -9.797958971), (-0.2, -9.797958971))
            Line((-0.2, -9.797958971), (-0.2, 0))
            Line((-0.2, 0), (0, 0.2))
            ThreePointArc((0, 0.2), (4, 0.2), (7.96, 0.195959179))
            Line((7.96, 0.195959179), (8, 0))
        make_face()
    extrude(amount=52.989794856, mode=Mode.SUBTRACT)
    with BuildSketch(Plane(origin=(100, -15, -25), x_dir=(-1, 0, 0), z_dir=(0, 0, 1)), Plane(origin=(100, 15, -25), x_dir=(0, -1, 0), z_dir=(0, 0, 1))) as fillet2_piece_3:
        with BuildLine():
            CenterArc((FILLET2_R, -FILLET2_R), FILLET2_R, 90, 90)
            Line((0, -FILLET2_R), (-FILLET2_R * 0.02, -FILLET2_R))
            Line((-FILLET2_R * 0.02, -FILLET2_R), (-FILLET2_R * 0.02, FILLET2_R * 0.02))
            Line((-FILLET2_R * 0.02, FILLET2_R * 0.02), (FILLET2_R, FILLET2_R * 0.02))
            Line((FILLET2_R, FILLET2_R * 0.02), (FILLET2_R, 0))
        make_face()
    extrude(amount=54, mode=Mode.SUBTRACT)


solid = part.part
